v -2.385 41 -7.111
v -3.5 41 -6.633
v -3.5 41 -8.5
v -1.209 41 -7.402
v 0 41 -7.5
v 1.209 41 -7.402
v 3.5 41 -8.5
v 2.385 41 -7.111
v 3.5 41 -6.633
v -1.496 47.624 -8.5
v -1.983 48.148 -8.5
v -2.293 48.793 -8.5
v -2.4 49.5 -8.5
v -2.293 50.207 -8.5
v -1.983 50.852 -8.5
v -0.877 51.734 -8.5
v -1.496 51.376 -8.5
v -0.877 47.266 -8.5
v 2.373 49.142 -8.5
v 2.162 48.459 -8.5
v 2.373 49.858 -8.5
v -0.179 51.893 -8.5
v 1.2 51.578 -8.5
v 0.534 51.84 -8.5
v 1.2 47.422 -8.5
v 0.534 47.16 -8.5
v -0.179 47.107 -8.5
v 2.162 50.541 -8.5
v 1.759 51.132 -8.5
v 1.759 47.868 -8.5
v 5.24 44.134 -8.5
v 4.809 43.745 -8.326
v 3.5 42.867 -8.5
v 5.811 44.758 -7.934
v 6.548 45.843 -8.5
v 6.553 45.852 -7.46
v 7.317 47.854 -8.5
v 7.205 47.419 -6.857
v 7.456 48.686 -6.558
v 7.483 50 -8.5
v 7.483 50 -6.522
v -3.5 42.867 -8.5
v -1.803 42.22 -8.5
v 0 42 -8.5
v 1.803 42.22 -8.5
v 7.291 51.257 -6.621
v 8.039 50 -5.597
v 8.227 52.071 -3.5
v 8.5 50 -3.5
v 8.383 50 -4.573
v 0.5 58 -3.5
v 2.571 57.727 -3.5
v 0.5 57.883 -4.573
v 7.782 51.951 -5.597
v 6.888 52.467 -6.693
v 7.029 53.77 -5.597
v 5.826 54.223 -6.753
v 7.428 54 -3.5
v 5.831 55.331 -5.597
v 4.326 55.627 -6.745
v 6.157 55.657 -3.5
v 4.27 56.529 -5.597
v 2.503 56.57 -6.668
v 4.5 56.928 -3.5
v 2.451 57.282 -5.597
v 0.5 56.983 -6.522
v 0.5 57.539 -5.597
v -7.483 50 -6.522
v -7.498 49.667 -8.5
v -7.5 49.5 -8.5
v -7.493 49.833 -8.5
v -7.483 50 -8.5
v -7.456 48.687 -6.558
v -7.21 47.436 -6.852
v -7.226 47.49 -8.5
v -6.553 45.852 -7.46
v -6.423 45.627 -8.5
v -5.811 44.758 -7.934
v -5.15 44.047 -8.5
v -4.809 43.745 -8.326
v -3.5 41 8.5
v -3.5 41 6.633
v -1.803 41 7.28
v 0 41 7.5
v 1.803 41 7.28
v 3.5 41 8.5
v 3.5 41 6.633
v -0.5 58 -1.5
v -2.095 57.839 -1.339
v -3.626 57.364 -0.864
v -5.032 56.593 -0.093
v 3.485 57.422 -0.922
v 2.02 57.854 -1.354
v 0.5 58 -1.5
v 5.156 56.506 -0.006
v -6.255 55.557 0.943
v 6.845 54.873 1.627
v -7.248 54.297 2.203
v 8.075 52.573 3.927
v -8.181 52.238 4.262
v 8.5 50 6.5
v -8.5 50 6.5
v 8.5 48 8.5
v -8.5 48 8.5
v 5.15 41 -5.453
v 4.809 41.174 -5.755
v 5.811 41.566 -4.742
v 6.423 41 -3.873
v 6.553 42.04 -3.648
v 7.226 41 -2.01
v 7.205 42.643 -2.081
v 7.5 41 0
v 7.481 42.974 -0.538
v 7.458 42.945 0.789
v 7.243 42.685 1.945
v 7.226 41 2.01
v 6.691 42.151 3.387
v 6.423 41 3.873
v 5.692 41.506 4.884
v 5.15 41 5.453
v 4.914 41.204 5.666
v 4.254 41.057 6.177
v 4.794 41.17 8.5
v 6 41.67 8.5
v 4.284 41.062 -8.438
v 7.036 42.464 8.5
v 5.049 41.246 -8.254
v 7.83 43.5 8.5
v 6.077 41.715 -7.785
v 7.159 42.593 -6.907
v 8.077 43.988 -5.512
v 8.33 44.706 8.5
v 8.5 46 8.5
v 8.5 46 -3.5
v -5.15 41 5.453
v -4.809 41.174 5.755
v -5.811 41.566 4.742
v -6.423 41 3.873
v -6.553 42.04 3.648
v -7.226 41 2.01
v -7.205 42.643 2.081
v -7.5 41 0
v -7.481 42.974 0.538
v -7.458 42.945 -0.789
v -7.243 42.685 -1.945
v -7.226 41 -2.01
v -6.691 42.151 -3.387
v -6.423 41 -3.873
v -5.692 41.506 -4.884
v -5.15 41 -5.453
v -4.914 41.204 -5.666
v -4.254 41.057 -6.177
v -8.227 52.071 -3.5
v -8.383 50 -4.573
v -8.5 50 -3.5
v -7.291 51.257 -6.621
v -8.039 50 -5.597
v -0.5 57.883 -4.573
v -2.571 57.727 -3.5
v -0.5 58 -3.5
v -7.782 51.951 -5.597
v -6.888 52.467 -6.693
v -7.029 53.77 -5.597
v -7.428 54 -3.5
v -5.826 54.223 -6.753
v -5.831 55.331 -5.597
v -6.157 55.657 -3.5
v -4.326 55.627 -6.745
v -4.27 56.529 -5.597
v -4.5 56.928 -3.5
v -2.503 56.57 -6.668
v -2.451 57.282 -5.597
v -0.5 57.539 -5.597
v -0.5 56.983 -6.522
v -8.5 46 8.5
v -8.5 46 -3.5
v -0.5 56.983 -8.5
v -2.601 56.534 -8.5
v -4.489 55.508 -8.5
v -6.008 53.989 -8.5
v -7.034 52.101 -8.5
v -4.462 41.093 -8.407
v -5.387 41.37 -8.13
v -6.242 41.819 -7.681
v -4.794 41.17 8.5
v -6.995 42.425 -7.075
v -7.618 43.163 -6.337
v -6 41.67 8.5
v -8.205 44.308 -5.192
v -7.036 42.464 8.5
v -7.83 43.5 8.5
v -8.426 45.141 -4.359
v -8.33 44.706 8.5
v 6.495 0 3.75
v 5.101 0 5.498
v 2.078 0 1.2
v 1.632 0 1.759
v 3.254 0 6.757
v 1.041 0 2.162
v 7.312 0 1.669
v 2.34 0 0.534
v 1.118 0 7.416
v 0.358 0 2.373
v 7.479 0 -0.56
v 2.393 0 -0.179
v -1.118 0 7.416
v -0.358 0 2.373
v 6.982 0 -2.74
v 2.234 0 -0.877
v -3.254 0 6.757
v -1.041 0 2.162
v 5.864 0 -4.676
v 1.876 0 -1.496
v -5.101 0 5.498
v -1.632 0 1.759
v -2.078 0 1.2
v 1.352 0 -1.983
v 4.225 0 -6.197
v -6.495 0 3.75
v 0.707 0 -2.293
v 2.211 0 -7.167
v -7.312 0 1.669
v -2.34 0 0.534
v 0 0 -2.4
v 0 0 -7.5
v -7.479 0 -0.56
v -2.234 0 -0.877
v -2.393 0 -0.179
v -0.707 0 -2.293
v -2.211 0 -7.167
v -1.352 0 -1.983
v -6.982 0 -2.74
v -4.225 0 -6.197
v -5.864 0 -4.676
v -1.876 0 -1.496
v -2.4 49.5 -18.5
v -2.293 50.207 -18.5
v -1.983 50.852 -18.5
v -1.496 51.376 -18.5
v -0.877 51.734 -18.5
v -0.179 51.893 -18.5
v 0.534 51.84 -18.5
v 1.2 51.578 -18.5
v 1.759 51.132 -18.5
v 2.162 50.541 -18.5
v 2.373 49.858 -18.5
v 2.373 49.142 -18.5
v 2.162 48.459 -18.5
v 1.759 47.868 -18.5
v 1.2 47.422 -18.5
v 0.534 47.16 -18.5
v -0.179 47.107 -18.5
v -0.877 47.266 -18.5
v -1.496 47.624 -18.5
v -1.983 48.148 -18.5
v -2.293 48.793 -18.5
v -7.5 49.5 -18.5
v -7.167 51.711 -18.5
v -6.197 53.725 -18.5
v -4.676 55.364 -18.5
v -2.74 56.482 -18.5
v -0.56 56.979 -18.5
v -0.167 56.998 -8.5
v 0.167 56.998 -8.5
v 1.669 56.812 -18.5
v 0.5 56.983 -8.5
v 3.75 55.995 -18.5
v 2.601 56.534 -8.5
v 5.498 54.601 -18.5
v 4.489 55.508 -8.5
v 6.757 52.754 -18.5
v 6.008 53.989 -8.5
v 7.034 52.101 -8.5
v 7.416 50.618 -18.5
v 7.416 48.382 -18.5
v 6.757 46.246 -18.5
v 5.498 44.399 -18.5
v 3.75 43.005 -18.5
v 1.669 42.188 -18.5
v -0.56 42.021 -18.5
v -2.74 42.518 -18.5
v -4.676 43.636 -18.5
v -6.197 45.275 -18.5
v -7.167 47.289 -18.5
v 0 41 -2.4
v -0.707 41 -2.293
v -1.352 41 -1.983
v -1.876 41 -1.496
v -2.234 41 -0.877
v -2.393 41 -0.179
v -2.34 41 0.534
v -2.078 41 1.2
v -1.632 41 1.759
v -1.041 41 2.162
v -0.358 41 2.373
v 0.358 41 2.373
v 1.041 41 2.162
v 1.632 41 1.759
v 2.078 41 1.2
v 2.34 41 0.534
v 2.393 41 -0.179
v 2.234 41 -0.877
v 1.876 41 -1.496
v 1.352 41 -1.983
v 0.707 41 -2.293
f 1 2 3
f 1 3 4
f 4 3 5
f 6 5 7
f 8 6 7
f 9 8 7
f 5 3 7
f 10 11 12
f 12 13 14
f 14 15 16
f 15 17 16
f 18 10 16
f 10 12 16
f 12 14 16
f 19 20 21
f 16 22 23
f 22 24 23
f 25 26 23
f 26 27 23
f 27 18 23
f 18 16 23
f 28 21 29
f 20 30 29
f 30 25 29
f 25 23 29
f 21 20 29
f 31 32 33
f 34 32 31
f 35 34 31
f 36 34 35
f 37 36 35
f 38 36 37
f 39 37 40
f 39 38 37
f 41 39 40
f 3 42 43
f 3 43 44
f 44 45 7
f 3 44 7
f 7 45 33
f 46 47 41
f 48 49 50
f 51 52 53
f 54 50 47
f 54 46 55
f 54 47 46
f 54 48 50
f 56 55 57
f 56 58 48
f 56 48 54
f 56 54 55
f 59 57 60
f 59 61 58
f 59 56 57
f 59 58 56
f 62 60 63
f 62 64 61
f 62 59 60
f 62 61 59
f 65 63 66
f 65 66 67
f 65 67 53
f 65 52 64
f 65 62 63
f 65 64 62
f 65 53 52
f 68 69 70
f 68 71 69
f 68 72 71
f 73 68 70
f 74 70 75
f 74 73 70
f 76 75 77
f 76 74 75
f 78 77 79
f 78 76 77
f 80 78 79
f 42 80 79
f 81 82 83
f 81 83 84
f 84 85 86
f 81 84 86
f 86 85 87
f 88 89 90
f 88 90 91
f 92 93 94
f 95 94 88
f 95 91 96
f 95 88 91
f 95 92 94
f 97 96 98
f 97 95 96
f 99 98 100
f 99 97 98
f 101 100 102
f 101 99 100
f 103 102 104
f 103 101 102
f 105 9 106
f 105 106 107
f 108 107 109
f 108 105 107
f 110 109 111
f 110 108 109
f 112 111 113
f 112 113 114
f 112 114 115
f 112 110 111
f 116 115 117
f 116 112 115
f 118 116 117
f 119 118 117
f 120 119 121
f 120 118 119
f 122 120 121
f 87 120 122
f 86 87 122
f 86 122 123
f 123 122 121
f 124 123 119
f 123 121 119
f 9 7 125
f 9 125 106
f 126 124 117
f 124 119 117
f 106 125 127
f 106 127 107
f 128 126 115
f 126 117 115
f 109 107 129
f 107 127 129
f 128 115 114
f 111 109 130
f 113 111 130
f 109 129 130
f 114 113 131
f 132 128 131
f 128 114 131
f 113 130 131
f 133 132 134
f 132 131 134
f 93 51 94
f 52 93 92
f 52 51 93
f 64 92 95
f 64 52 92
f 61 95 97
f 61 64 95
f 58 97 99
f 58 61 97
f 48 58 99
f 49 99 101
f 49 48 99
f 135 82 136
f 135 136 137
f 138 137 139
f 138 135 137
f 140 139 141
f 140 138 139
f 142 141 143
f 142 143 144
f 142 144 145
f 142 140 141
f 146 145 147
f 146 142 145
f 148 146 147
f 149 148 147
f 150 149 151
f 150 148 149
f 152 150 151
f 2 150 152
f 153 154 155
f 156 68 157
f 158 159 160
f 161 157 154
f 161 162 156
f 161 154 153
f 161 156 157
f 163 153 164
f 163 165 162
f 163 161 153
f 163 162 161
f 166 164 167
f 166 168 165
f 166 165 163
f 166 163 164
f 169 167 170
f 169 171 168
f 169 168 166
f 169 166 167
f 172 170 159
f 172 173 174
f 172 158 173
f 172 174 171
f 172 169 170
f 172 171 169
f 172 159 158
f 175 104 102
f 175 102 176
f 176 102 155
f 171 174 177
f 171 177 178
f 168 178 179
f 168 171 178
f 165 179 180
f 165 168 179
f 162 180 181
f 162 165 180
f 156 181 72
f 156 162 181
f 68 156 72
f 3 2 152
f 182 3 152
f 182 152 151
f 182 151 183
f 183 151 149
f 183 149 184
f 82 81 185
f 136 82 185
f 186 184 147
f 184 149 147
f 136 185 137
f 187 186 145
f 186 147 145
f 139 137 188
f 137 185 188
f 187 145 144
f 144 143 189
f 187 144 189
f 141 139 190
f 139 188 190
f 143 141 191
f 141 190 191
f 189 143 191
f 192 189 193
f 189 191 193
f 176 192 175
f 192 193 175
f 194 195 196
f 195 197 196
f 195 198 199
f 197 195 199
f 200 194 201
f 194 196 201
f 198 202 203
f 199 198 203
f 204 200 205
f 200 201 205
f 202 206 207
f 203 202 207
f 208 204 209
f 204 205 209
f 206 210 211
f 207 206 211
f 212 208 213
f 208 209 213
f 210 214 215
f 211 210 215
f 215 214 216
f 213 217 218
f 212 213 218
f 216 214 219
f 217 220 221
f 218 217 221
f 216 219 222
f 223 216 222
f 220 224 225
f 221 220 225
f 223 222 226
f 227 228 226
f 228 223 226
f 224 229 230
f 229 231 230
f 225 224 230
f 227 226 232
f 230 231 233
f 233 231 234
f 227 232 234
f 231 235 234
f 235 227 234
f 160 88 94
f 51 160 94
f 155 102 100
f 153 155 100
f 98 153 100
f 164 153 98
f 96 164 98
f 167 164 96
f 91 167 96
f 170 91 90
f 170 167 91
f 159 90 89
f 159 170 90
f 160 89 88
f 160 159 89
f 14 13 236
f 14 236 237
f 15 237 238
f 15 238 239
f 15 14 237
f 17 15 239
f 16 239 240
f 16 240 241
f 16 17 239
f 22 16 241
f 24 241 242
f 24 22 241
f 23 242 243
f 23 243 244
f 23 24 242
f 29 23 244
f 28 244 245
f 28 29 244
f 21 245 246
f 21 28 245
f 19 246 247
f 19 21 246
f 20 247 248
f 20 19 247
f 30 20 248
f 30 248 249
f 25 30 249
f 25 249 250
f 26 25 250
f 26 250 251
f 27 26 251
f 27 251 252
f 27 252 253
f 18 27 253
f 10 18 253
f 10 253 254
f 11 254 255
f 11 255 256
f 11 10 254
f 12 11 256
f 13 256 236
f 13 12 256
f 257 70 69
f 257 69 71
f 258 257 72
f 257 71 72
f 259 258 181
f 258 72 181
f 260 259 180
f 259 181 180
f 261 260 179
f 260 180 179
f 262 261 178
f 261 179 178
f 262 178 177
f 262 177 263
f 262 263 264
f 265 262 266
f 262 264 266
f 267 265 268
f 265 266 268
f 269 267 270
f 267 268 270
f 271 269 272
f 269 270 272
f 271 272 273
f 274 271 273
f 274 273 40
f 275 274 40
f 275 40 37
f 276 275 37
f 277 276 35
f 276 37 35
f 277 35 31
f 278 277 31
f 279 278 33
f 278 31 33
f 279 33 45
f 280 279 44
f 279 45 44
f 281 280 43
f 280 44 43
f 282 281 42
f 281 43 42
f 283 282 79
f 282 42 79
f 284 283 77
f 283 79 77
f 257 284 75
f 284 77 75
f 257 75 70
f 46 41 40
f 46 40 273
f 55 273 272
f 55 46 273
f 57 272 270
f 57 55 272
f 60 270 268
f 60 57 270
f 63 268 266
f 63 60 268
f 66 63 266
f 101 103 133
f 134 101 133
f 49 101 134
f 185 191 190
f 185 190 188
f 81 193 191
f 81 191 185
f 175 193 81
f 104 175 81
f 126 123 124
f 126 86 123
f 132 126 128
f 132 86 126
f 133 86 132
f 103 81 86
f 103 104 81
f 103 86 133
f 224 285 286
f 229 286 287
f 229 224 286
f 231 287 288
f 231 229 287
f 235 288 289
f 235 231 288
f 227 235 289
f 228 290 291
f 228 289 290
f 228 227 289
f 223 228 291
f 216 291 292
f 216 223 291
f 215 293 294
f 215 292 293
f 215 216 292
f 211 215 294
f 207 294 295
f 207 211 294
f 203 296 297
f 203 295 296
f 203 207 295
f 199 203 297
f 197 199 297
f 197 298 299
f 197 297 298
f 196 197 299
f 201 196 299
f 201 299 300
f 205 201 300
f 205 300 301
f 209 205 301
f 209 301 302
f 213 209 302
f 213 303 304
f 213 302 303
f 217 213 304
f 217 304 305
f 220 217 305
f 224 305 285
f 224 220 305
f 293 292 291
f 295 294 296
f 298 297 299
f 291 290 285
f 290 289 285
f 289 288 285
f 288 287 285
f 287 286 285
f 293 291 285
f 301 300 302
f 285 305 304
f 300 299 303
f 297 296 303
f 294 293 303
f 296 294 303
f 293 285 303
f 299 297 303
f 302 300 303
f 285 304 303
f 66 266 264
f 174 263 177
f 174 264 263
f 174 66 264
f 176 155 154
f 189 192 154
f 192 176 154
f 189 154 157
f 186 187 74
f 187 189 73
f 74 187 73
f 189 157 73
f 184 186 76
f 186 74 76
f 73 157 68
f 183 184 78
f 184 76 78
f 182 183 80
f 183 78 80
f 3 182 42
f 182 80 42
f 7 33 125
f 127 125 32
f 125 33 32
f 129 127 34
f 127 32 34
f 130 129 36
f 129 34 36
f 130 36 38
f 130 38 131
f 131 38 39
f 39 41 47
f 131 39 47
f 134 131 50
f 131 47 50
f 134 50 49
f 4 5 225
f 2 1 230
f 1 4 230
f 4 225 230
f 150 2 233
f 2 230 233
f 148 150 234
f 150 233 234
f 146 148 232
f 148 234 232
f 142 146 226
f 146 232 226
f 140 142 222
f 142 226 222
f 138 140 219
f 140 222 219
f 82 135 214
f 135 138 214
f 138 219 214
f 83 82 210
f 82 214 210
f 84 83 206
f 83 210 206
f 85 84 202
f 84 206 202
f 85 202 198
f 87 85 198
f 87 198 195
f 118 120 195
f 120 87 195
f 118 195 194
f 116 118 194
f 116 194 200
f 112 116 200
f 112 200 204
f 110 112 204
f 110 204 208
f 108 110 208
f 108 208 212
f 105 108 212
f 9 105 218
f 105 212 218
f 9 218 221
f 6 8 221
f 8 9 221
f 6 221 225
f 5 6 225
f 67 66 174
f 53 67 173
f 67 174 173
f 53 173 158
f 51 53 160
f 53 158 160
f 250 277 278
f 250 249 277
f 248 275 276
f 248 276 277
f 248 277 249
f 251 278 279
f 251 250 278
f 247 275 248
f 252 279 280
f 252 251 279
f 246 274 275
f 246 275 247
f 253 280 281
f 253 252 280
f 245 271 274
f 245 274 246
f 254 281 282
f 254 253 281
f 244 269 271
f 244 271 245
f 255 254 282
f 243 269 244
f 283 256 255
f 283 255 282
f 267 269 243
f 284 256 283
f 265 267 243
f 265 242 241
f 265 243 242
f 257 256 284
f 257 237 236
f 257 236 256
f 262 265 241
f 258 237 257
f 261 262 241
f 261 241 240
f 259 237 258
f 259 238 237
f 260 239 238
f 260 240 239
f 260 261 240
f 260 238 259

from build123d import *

# Parameters (mm, degrees)
SKETCH1_R           = 7.5
SKETCH1_R_2         = 2.4
BOSS_EXTRUDE1_DEPTH = 58
SKETCH2_W           = 17
SKETCH2_H           = 17
BOSS_EXTRUDE2_DEPTH = 17
SKETCH3_R           = 7.5
SKETCH3_R_2         = 2.4
BOSS_EXTRUDE3_DEPTH = 10
FILLET5_R           = 8
CHAMFER1_SIZE       = 10
FILLET4_R           = 5


with BuildPart() as part:
    # Sketch1 → Boss-Extrude1 (new body)
    with BuildSketch(Plane(origin=(0, 0, 0), x_dir=(1, 0, 0), z_dir=(0, 1, 0))):
        with Locations(Location((0, 0, 0), (0, 0, 90))):
            Circle(SKETCH1_R)
        with Locations(Location((0, 0, 0), (0, 0, 90))):
            Circle(SKETCH1_R_2, mode=Mode.SUBTRACT)
    extrude(amount=BOSS_EXTRUDE1_DEPTH)

    # Sketch2 → Boss-Extrude2 (add)
    with BuildSketch(Plane(origin=(0, 58, 0), x_dir=(1, 0, 0), z_dir=(0, 1, 0))):
        Rectangle(SKETCH2_W, SKETCH2_H)
    extrude(amount=-BOSS_EXTRUDE2_DEPTH)

    # Sketch3 → Boss-Extrude3 (add)
    with BuildSketch(Plane(origin=(0, 0, -8.5), x_dir=(-1, 0, 0), z_dir=(0, 0, -1))):
        with Locations((0, 49.5)):
            Circle(SKETCH3_R)
        with Locations((0, 49.5)):
            Circle(SKETCH3_R_2, mode=Mode.SUBTRACT)
    extrude(amount=BOSS_EXTRUDE3_DEPTH)

    # Fillet5
    fillet5_edges = [part.edges().sort_by_distance(p)[0] for p in [
        (8.5, 58, 0),
        (-8.5, 58, 0),
    ]]
    fillet(fillet5_edges, radius=FILLET5_R)

    # Chamfer1
    # the kernel refuses this chamfer: 10 mm, written as the material it takes off along each edge
    with BuildSketch(Plane(origin=(26.21682988, 58, 8.5), x_dir=(0, 0.027495876610586317, -0.9996219169112968), z_dir=(-1, 0, 0))) as chamfer1_piece_1:
        Polygon((CHAMFER1_SIZE * 0.999621916911, CHAMFER1_SIZE * 0.0274958766106), (-CHAMFER1_SIZE * 0.0274958766106, CHAMFER1_SIZE * 0.999621916911), (0, 0), align=None)
    extrude(amount=52.433659759, mode=Mode.SUBTRACT)

    # Fillet4
    # the kernel refuses this fillet: 5 mm, written as the material it takes off along each edge
    with BuildSketch(Plane(origin=(-8.5, 50, -8.5), x_dir=(1, 0, 0), z_dir=(0, -1, 0))) as fillet4_piece_1_section:
        with BuildLine():
            CenterArc((FILLET4_R, FILLET4_R), FILLET4_R, 180, 90)
            Line((0, FILLET4_R), (0, 0))
            Line((0, 0), (FILLET4_R, 0))
        make_face()
    fillet4_piece_1 = extrude(amount=21.5, mode=Mode.PRIVATE)
    fillet4_piece_1 = fillet4_piece_1 - Plane(origin=(0, 49.5, -7.300599215), x_dir=(-1, 0, 0), z_dir=(0, 0, 1)) * Cylinder(7.5, 64, mode=Mode.PRIVATE)
    add(fillet4_piece_1, mode=Mode.SUBTRACT)
    with BuildSketch(Plane(origin=(8.5, 50, -8.5), x_dir=(-1, 0, 0), z_dir=(0, -1, 0))) as fillet4_piece_2_section:
        with BuildLine():
            CenterArc((FILLET4_R, -FILLET4_R), FILLET4_R, 90, 90)
            Line((0, -FILLET4_R), (0, 0))
            Line((0, 0), (FILLET4_R, 0))
        make_face()
    fillet4_piece_2 = extrude(amount=21.5, mode=Mode.PRIVATE)
    fillet4_piece_2 = fillet4_piece_2 - Plane(origin=(0, 49.5, -7.300599064), x_dir=(-1, 0, 0), z_dir=(0, 0, 1)) * Cylinder(7.5, 63, mode=Mode.PRIVATE)
    add(fillet4_piece_2, mode=Mode.SUBTRACT)
    with BuildSketch(Plane(origin=(8.5, 41, -21), x_dir=(-1, 0, 0), z_dir=(0, 0, 1))) as fillet4_piece_3_section:
        with BuildLine():
            CenterArc((FILLET4_R, -FILLET4_R), FILLET4_R, 90, 90)
            Line((0, -FILLET4_R), (0, 0))
            Line((0, 0), (FILLET4_R, 0))
        make_face()
    fillet4_piece_3 = extrude(amount=42, mode=Mode.PRIVATE)
    fillet4_piece_3 = fillet4_piece_3 - Plane(origin=(0, 41.109676193, 0), x_dir=(0, 0, -1), z_dir=(0, -1, 0)) * Cylinder(7.5, 104, mode=Mode.PRIVATE)
    add(fillet4_piece_3, mode=Mode.SUBTRACT)
    with BuildSketch(Plane(origin=(-8.5, 41, 21), x_dir=(0, 1, 0), z_dir=(0, 0, -1))) as fillet4_piece_4_section:
        with BuildLine():
            CenterArc((FILLET4_R, FILLET4_R), FILLET4_R, 180, 90)
            Line((0, FILLET4_R), (0, 0))
            Line((0, 0), (FILLET4_R, 0))
        make_face()
    fillet4_piece_4 = extrude(amount=42, mode=Mode.PRIVATE)
    fillet4_piece_4 = fillet4_piece_4 - Plane(origin=(0, 44.689641685, 0), x_dir=(0, 0, -1), z_dir=(0, -1, 0)) * Cylinder(7.5, 104, mode=Mode.PRIVATE)
    add(fillet4_piece_4, mode=Mode.SUBTRACT)
    with BuildSketch(Plane(origin=(0.5, 50, -8.5), x_dir=(1, 0, 0), z_dir=(0, -1, 0))) as fillet4_piece_5_section:
        with BuildLine():
            CenterArc((8 - FILLET4_R, FILLET4_R), FILLET4_R, 270, 90)
            Line((8, FILLET4_R), (8, 0))
            Line((8, 0), (8 - FILLET4_R, 0))
        make_face()
    fillet4_piece_5 = revolve(axis=Axis((0.5, 50, -8.5), (0, 0, 1)), revolution_arc=90, mode=Mode.PRIVATE)
    fillet4_piece_5 = fillet4_piece_5 - Plane(origin=(0, 49.5, -6.88973409), x_dir=(-1, 0, 0), z_dir=(0, 0, 1)) * Cylinder(7.5, 33, mode=Mode.PRIVATE)
    add(fillet4_piece_5, mode=Mode.SUBTRACT)
    with BuildSketch(Plane(origin=(-0.5, 58, -8.5), x_dir=(0, -1, 0), z_dir=(1, 0, 0))) as fillet4_piece_6_section:
        with BuildLine():
            CenterArc((FILLET4_R, -FILLET4_R), FILLET4_R, 90, 90)
            Line((0, -FILLET4_R), (0, 0))
            Line((0, 0), (FILLET4_R, 0))
        make_face()
    fillet4_piece_6 = extrude(amount=1, mode=Mode.PRIVATE)
    fillet4_piece_6 = fillet4_piece_6 - Plane(origin=(0, 49.5, -6.859352055), x_dir=(-1, 0, 0), z_dir=(0, 0, 1)) * Cylinder(7.5, 23, mode=Mode.PRIVATE)
    add(fillet4_piece_6, mode=Mode.SUBTRACT)
    with BuildSketch(Plane(origin=(-0.5, 50, -8.5), x_dir=(-1, 0, 0), z_dir=(0, -1, 0))) as fillet4_piece_7_section:
        with BuildLine():
            CenterArc((8 - FILLET4_R, -FILLET4_R), FILLET4_R, 0, 90)
            Line((8, -FILLET4_R), (8, 0))
            Line((8, 0), (8 - FILLET4_R, 0))
        make_face()
    fillet4_piece_7 = revolve(axis=Axis((-0.5, 50, -8.5), (0, 0, -1)), revolution_arc=90, mode=Mode.PRIVATE)
    fillet4_piece_7 = fillet4_piece_7 - Plane(origin=(0, 49.5, -6.889734089), x_dir=(-1, 0, 0), z_dir=(0, 0, 1)) * Cylinder(7.5, 32, mode=Mode.PRIVATE)
    add(fillet4_piece_7, mode=Mode.SUBTRACT)


solid = part.part
